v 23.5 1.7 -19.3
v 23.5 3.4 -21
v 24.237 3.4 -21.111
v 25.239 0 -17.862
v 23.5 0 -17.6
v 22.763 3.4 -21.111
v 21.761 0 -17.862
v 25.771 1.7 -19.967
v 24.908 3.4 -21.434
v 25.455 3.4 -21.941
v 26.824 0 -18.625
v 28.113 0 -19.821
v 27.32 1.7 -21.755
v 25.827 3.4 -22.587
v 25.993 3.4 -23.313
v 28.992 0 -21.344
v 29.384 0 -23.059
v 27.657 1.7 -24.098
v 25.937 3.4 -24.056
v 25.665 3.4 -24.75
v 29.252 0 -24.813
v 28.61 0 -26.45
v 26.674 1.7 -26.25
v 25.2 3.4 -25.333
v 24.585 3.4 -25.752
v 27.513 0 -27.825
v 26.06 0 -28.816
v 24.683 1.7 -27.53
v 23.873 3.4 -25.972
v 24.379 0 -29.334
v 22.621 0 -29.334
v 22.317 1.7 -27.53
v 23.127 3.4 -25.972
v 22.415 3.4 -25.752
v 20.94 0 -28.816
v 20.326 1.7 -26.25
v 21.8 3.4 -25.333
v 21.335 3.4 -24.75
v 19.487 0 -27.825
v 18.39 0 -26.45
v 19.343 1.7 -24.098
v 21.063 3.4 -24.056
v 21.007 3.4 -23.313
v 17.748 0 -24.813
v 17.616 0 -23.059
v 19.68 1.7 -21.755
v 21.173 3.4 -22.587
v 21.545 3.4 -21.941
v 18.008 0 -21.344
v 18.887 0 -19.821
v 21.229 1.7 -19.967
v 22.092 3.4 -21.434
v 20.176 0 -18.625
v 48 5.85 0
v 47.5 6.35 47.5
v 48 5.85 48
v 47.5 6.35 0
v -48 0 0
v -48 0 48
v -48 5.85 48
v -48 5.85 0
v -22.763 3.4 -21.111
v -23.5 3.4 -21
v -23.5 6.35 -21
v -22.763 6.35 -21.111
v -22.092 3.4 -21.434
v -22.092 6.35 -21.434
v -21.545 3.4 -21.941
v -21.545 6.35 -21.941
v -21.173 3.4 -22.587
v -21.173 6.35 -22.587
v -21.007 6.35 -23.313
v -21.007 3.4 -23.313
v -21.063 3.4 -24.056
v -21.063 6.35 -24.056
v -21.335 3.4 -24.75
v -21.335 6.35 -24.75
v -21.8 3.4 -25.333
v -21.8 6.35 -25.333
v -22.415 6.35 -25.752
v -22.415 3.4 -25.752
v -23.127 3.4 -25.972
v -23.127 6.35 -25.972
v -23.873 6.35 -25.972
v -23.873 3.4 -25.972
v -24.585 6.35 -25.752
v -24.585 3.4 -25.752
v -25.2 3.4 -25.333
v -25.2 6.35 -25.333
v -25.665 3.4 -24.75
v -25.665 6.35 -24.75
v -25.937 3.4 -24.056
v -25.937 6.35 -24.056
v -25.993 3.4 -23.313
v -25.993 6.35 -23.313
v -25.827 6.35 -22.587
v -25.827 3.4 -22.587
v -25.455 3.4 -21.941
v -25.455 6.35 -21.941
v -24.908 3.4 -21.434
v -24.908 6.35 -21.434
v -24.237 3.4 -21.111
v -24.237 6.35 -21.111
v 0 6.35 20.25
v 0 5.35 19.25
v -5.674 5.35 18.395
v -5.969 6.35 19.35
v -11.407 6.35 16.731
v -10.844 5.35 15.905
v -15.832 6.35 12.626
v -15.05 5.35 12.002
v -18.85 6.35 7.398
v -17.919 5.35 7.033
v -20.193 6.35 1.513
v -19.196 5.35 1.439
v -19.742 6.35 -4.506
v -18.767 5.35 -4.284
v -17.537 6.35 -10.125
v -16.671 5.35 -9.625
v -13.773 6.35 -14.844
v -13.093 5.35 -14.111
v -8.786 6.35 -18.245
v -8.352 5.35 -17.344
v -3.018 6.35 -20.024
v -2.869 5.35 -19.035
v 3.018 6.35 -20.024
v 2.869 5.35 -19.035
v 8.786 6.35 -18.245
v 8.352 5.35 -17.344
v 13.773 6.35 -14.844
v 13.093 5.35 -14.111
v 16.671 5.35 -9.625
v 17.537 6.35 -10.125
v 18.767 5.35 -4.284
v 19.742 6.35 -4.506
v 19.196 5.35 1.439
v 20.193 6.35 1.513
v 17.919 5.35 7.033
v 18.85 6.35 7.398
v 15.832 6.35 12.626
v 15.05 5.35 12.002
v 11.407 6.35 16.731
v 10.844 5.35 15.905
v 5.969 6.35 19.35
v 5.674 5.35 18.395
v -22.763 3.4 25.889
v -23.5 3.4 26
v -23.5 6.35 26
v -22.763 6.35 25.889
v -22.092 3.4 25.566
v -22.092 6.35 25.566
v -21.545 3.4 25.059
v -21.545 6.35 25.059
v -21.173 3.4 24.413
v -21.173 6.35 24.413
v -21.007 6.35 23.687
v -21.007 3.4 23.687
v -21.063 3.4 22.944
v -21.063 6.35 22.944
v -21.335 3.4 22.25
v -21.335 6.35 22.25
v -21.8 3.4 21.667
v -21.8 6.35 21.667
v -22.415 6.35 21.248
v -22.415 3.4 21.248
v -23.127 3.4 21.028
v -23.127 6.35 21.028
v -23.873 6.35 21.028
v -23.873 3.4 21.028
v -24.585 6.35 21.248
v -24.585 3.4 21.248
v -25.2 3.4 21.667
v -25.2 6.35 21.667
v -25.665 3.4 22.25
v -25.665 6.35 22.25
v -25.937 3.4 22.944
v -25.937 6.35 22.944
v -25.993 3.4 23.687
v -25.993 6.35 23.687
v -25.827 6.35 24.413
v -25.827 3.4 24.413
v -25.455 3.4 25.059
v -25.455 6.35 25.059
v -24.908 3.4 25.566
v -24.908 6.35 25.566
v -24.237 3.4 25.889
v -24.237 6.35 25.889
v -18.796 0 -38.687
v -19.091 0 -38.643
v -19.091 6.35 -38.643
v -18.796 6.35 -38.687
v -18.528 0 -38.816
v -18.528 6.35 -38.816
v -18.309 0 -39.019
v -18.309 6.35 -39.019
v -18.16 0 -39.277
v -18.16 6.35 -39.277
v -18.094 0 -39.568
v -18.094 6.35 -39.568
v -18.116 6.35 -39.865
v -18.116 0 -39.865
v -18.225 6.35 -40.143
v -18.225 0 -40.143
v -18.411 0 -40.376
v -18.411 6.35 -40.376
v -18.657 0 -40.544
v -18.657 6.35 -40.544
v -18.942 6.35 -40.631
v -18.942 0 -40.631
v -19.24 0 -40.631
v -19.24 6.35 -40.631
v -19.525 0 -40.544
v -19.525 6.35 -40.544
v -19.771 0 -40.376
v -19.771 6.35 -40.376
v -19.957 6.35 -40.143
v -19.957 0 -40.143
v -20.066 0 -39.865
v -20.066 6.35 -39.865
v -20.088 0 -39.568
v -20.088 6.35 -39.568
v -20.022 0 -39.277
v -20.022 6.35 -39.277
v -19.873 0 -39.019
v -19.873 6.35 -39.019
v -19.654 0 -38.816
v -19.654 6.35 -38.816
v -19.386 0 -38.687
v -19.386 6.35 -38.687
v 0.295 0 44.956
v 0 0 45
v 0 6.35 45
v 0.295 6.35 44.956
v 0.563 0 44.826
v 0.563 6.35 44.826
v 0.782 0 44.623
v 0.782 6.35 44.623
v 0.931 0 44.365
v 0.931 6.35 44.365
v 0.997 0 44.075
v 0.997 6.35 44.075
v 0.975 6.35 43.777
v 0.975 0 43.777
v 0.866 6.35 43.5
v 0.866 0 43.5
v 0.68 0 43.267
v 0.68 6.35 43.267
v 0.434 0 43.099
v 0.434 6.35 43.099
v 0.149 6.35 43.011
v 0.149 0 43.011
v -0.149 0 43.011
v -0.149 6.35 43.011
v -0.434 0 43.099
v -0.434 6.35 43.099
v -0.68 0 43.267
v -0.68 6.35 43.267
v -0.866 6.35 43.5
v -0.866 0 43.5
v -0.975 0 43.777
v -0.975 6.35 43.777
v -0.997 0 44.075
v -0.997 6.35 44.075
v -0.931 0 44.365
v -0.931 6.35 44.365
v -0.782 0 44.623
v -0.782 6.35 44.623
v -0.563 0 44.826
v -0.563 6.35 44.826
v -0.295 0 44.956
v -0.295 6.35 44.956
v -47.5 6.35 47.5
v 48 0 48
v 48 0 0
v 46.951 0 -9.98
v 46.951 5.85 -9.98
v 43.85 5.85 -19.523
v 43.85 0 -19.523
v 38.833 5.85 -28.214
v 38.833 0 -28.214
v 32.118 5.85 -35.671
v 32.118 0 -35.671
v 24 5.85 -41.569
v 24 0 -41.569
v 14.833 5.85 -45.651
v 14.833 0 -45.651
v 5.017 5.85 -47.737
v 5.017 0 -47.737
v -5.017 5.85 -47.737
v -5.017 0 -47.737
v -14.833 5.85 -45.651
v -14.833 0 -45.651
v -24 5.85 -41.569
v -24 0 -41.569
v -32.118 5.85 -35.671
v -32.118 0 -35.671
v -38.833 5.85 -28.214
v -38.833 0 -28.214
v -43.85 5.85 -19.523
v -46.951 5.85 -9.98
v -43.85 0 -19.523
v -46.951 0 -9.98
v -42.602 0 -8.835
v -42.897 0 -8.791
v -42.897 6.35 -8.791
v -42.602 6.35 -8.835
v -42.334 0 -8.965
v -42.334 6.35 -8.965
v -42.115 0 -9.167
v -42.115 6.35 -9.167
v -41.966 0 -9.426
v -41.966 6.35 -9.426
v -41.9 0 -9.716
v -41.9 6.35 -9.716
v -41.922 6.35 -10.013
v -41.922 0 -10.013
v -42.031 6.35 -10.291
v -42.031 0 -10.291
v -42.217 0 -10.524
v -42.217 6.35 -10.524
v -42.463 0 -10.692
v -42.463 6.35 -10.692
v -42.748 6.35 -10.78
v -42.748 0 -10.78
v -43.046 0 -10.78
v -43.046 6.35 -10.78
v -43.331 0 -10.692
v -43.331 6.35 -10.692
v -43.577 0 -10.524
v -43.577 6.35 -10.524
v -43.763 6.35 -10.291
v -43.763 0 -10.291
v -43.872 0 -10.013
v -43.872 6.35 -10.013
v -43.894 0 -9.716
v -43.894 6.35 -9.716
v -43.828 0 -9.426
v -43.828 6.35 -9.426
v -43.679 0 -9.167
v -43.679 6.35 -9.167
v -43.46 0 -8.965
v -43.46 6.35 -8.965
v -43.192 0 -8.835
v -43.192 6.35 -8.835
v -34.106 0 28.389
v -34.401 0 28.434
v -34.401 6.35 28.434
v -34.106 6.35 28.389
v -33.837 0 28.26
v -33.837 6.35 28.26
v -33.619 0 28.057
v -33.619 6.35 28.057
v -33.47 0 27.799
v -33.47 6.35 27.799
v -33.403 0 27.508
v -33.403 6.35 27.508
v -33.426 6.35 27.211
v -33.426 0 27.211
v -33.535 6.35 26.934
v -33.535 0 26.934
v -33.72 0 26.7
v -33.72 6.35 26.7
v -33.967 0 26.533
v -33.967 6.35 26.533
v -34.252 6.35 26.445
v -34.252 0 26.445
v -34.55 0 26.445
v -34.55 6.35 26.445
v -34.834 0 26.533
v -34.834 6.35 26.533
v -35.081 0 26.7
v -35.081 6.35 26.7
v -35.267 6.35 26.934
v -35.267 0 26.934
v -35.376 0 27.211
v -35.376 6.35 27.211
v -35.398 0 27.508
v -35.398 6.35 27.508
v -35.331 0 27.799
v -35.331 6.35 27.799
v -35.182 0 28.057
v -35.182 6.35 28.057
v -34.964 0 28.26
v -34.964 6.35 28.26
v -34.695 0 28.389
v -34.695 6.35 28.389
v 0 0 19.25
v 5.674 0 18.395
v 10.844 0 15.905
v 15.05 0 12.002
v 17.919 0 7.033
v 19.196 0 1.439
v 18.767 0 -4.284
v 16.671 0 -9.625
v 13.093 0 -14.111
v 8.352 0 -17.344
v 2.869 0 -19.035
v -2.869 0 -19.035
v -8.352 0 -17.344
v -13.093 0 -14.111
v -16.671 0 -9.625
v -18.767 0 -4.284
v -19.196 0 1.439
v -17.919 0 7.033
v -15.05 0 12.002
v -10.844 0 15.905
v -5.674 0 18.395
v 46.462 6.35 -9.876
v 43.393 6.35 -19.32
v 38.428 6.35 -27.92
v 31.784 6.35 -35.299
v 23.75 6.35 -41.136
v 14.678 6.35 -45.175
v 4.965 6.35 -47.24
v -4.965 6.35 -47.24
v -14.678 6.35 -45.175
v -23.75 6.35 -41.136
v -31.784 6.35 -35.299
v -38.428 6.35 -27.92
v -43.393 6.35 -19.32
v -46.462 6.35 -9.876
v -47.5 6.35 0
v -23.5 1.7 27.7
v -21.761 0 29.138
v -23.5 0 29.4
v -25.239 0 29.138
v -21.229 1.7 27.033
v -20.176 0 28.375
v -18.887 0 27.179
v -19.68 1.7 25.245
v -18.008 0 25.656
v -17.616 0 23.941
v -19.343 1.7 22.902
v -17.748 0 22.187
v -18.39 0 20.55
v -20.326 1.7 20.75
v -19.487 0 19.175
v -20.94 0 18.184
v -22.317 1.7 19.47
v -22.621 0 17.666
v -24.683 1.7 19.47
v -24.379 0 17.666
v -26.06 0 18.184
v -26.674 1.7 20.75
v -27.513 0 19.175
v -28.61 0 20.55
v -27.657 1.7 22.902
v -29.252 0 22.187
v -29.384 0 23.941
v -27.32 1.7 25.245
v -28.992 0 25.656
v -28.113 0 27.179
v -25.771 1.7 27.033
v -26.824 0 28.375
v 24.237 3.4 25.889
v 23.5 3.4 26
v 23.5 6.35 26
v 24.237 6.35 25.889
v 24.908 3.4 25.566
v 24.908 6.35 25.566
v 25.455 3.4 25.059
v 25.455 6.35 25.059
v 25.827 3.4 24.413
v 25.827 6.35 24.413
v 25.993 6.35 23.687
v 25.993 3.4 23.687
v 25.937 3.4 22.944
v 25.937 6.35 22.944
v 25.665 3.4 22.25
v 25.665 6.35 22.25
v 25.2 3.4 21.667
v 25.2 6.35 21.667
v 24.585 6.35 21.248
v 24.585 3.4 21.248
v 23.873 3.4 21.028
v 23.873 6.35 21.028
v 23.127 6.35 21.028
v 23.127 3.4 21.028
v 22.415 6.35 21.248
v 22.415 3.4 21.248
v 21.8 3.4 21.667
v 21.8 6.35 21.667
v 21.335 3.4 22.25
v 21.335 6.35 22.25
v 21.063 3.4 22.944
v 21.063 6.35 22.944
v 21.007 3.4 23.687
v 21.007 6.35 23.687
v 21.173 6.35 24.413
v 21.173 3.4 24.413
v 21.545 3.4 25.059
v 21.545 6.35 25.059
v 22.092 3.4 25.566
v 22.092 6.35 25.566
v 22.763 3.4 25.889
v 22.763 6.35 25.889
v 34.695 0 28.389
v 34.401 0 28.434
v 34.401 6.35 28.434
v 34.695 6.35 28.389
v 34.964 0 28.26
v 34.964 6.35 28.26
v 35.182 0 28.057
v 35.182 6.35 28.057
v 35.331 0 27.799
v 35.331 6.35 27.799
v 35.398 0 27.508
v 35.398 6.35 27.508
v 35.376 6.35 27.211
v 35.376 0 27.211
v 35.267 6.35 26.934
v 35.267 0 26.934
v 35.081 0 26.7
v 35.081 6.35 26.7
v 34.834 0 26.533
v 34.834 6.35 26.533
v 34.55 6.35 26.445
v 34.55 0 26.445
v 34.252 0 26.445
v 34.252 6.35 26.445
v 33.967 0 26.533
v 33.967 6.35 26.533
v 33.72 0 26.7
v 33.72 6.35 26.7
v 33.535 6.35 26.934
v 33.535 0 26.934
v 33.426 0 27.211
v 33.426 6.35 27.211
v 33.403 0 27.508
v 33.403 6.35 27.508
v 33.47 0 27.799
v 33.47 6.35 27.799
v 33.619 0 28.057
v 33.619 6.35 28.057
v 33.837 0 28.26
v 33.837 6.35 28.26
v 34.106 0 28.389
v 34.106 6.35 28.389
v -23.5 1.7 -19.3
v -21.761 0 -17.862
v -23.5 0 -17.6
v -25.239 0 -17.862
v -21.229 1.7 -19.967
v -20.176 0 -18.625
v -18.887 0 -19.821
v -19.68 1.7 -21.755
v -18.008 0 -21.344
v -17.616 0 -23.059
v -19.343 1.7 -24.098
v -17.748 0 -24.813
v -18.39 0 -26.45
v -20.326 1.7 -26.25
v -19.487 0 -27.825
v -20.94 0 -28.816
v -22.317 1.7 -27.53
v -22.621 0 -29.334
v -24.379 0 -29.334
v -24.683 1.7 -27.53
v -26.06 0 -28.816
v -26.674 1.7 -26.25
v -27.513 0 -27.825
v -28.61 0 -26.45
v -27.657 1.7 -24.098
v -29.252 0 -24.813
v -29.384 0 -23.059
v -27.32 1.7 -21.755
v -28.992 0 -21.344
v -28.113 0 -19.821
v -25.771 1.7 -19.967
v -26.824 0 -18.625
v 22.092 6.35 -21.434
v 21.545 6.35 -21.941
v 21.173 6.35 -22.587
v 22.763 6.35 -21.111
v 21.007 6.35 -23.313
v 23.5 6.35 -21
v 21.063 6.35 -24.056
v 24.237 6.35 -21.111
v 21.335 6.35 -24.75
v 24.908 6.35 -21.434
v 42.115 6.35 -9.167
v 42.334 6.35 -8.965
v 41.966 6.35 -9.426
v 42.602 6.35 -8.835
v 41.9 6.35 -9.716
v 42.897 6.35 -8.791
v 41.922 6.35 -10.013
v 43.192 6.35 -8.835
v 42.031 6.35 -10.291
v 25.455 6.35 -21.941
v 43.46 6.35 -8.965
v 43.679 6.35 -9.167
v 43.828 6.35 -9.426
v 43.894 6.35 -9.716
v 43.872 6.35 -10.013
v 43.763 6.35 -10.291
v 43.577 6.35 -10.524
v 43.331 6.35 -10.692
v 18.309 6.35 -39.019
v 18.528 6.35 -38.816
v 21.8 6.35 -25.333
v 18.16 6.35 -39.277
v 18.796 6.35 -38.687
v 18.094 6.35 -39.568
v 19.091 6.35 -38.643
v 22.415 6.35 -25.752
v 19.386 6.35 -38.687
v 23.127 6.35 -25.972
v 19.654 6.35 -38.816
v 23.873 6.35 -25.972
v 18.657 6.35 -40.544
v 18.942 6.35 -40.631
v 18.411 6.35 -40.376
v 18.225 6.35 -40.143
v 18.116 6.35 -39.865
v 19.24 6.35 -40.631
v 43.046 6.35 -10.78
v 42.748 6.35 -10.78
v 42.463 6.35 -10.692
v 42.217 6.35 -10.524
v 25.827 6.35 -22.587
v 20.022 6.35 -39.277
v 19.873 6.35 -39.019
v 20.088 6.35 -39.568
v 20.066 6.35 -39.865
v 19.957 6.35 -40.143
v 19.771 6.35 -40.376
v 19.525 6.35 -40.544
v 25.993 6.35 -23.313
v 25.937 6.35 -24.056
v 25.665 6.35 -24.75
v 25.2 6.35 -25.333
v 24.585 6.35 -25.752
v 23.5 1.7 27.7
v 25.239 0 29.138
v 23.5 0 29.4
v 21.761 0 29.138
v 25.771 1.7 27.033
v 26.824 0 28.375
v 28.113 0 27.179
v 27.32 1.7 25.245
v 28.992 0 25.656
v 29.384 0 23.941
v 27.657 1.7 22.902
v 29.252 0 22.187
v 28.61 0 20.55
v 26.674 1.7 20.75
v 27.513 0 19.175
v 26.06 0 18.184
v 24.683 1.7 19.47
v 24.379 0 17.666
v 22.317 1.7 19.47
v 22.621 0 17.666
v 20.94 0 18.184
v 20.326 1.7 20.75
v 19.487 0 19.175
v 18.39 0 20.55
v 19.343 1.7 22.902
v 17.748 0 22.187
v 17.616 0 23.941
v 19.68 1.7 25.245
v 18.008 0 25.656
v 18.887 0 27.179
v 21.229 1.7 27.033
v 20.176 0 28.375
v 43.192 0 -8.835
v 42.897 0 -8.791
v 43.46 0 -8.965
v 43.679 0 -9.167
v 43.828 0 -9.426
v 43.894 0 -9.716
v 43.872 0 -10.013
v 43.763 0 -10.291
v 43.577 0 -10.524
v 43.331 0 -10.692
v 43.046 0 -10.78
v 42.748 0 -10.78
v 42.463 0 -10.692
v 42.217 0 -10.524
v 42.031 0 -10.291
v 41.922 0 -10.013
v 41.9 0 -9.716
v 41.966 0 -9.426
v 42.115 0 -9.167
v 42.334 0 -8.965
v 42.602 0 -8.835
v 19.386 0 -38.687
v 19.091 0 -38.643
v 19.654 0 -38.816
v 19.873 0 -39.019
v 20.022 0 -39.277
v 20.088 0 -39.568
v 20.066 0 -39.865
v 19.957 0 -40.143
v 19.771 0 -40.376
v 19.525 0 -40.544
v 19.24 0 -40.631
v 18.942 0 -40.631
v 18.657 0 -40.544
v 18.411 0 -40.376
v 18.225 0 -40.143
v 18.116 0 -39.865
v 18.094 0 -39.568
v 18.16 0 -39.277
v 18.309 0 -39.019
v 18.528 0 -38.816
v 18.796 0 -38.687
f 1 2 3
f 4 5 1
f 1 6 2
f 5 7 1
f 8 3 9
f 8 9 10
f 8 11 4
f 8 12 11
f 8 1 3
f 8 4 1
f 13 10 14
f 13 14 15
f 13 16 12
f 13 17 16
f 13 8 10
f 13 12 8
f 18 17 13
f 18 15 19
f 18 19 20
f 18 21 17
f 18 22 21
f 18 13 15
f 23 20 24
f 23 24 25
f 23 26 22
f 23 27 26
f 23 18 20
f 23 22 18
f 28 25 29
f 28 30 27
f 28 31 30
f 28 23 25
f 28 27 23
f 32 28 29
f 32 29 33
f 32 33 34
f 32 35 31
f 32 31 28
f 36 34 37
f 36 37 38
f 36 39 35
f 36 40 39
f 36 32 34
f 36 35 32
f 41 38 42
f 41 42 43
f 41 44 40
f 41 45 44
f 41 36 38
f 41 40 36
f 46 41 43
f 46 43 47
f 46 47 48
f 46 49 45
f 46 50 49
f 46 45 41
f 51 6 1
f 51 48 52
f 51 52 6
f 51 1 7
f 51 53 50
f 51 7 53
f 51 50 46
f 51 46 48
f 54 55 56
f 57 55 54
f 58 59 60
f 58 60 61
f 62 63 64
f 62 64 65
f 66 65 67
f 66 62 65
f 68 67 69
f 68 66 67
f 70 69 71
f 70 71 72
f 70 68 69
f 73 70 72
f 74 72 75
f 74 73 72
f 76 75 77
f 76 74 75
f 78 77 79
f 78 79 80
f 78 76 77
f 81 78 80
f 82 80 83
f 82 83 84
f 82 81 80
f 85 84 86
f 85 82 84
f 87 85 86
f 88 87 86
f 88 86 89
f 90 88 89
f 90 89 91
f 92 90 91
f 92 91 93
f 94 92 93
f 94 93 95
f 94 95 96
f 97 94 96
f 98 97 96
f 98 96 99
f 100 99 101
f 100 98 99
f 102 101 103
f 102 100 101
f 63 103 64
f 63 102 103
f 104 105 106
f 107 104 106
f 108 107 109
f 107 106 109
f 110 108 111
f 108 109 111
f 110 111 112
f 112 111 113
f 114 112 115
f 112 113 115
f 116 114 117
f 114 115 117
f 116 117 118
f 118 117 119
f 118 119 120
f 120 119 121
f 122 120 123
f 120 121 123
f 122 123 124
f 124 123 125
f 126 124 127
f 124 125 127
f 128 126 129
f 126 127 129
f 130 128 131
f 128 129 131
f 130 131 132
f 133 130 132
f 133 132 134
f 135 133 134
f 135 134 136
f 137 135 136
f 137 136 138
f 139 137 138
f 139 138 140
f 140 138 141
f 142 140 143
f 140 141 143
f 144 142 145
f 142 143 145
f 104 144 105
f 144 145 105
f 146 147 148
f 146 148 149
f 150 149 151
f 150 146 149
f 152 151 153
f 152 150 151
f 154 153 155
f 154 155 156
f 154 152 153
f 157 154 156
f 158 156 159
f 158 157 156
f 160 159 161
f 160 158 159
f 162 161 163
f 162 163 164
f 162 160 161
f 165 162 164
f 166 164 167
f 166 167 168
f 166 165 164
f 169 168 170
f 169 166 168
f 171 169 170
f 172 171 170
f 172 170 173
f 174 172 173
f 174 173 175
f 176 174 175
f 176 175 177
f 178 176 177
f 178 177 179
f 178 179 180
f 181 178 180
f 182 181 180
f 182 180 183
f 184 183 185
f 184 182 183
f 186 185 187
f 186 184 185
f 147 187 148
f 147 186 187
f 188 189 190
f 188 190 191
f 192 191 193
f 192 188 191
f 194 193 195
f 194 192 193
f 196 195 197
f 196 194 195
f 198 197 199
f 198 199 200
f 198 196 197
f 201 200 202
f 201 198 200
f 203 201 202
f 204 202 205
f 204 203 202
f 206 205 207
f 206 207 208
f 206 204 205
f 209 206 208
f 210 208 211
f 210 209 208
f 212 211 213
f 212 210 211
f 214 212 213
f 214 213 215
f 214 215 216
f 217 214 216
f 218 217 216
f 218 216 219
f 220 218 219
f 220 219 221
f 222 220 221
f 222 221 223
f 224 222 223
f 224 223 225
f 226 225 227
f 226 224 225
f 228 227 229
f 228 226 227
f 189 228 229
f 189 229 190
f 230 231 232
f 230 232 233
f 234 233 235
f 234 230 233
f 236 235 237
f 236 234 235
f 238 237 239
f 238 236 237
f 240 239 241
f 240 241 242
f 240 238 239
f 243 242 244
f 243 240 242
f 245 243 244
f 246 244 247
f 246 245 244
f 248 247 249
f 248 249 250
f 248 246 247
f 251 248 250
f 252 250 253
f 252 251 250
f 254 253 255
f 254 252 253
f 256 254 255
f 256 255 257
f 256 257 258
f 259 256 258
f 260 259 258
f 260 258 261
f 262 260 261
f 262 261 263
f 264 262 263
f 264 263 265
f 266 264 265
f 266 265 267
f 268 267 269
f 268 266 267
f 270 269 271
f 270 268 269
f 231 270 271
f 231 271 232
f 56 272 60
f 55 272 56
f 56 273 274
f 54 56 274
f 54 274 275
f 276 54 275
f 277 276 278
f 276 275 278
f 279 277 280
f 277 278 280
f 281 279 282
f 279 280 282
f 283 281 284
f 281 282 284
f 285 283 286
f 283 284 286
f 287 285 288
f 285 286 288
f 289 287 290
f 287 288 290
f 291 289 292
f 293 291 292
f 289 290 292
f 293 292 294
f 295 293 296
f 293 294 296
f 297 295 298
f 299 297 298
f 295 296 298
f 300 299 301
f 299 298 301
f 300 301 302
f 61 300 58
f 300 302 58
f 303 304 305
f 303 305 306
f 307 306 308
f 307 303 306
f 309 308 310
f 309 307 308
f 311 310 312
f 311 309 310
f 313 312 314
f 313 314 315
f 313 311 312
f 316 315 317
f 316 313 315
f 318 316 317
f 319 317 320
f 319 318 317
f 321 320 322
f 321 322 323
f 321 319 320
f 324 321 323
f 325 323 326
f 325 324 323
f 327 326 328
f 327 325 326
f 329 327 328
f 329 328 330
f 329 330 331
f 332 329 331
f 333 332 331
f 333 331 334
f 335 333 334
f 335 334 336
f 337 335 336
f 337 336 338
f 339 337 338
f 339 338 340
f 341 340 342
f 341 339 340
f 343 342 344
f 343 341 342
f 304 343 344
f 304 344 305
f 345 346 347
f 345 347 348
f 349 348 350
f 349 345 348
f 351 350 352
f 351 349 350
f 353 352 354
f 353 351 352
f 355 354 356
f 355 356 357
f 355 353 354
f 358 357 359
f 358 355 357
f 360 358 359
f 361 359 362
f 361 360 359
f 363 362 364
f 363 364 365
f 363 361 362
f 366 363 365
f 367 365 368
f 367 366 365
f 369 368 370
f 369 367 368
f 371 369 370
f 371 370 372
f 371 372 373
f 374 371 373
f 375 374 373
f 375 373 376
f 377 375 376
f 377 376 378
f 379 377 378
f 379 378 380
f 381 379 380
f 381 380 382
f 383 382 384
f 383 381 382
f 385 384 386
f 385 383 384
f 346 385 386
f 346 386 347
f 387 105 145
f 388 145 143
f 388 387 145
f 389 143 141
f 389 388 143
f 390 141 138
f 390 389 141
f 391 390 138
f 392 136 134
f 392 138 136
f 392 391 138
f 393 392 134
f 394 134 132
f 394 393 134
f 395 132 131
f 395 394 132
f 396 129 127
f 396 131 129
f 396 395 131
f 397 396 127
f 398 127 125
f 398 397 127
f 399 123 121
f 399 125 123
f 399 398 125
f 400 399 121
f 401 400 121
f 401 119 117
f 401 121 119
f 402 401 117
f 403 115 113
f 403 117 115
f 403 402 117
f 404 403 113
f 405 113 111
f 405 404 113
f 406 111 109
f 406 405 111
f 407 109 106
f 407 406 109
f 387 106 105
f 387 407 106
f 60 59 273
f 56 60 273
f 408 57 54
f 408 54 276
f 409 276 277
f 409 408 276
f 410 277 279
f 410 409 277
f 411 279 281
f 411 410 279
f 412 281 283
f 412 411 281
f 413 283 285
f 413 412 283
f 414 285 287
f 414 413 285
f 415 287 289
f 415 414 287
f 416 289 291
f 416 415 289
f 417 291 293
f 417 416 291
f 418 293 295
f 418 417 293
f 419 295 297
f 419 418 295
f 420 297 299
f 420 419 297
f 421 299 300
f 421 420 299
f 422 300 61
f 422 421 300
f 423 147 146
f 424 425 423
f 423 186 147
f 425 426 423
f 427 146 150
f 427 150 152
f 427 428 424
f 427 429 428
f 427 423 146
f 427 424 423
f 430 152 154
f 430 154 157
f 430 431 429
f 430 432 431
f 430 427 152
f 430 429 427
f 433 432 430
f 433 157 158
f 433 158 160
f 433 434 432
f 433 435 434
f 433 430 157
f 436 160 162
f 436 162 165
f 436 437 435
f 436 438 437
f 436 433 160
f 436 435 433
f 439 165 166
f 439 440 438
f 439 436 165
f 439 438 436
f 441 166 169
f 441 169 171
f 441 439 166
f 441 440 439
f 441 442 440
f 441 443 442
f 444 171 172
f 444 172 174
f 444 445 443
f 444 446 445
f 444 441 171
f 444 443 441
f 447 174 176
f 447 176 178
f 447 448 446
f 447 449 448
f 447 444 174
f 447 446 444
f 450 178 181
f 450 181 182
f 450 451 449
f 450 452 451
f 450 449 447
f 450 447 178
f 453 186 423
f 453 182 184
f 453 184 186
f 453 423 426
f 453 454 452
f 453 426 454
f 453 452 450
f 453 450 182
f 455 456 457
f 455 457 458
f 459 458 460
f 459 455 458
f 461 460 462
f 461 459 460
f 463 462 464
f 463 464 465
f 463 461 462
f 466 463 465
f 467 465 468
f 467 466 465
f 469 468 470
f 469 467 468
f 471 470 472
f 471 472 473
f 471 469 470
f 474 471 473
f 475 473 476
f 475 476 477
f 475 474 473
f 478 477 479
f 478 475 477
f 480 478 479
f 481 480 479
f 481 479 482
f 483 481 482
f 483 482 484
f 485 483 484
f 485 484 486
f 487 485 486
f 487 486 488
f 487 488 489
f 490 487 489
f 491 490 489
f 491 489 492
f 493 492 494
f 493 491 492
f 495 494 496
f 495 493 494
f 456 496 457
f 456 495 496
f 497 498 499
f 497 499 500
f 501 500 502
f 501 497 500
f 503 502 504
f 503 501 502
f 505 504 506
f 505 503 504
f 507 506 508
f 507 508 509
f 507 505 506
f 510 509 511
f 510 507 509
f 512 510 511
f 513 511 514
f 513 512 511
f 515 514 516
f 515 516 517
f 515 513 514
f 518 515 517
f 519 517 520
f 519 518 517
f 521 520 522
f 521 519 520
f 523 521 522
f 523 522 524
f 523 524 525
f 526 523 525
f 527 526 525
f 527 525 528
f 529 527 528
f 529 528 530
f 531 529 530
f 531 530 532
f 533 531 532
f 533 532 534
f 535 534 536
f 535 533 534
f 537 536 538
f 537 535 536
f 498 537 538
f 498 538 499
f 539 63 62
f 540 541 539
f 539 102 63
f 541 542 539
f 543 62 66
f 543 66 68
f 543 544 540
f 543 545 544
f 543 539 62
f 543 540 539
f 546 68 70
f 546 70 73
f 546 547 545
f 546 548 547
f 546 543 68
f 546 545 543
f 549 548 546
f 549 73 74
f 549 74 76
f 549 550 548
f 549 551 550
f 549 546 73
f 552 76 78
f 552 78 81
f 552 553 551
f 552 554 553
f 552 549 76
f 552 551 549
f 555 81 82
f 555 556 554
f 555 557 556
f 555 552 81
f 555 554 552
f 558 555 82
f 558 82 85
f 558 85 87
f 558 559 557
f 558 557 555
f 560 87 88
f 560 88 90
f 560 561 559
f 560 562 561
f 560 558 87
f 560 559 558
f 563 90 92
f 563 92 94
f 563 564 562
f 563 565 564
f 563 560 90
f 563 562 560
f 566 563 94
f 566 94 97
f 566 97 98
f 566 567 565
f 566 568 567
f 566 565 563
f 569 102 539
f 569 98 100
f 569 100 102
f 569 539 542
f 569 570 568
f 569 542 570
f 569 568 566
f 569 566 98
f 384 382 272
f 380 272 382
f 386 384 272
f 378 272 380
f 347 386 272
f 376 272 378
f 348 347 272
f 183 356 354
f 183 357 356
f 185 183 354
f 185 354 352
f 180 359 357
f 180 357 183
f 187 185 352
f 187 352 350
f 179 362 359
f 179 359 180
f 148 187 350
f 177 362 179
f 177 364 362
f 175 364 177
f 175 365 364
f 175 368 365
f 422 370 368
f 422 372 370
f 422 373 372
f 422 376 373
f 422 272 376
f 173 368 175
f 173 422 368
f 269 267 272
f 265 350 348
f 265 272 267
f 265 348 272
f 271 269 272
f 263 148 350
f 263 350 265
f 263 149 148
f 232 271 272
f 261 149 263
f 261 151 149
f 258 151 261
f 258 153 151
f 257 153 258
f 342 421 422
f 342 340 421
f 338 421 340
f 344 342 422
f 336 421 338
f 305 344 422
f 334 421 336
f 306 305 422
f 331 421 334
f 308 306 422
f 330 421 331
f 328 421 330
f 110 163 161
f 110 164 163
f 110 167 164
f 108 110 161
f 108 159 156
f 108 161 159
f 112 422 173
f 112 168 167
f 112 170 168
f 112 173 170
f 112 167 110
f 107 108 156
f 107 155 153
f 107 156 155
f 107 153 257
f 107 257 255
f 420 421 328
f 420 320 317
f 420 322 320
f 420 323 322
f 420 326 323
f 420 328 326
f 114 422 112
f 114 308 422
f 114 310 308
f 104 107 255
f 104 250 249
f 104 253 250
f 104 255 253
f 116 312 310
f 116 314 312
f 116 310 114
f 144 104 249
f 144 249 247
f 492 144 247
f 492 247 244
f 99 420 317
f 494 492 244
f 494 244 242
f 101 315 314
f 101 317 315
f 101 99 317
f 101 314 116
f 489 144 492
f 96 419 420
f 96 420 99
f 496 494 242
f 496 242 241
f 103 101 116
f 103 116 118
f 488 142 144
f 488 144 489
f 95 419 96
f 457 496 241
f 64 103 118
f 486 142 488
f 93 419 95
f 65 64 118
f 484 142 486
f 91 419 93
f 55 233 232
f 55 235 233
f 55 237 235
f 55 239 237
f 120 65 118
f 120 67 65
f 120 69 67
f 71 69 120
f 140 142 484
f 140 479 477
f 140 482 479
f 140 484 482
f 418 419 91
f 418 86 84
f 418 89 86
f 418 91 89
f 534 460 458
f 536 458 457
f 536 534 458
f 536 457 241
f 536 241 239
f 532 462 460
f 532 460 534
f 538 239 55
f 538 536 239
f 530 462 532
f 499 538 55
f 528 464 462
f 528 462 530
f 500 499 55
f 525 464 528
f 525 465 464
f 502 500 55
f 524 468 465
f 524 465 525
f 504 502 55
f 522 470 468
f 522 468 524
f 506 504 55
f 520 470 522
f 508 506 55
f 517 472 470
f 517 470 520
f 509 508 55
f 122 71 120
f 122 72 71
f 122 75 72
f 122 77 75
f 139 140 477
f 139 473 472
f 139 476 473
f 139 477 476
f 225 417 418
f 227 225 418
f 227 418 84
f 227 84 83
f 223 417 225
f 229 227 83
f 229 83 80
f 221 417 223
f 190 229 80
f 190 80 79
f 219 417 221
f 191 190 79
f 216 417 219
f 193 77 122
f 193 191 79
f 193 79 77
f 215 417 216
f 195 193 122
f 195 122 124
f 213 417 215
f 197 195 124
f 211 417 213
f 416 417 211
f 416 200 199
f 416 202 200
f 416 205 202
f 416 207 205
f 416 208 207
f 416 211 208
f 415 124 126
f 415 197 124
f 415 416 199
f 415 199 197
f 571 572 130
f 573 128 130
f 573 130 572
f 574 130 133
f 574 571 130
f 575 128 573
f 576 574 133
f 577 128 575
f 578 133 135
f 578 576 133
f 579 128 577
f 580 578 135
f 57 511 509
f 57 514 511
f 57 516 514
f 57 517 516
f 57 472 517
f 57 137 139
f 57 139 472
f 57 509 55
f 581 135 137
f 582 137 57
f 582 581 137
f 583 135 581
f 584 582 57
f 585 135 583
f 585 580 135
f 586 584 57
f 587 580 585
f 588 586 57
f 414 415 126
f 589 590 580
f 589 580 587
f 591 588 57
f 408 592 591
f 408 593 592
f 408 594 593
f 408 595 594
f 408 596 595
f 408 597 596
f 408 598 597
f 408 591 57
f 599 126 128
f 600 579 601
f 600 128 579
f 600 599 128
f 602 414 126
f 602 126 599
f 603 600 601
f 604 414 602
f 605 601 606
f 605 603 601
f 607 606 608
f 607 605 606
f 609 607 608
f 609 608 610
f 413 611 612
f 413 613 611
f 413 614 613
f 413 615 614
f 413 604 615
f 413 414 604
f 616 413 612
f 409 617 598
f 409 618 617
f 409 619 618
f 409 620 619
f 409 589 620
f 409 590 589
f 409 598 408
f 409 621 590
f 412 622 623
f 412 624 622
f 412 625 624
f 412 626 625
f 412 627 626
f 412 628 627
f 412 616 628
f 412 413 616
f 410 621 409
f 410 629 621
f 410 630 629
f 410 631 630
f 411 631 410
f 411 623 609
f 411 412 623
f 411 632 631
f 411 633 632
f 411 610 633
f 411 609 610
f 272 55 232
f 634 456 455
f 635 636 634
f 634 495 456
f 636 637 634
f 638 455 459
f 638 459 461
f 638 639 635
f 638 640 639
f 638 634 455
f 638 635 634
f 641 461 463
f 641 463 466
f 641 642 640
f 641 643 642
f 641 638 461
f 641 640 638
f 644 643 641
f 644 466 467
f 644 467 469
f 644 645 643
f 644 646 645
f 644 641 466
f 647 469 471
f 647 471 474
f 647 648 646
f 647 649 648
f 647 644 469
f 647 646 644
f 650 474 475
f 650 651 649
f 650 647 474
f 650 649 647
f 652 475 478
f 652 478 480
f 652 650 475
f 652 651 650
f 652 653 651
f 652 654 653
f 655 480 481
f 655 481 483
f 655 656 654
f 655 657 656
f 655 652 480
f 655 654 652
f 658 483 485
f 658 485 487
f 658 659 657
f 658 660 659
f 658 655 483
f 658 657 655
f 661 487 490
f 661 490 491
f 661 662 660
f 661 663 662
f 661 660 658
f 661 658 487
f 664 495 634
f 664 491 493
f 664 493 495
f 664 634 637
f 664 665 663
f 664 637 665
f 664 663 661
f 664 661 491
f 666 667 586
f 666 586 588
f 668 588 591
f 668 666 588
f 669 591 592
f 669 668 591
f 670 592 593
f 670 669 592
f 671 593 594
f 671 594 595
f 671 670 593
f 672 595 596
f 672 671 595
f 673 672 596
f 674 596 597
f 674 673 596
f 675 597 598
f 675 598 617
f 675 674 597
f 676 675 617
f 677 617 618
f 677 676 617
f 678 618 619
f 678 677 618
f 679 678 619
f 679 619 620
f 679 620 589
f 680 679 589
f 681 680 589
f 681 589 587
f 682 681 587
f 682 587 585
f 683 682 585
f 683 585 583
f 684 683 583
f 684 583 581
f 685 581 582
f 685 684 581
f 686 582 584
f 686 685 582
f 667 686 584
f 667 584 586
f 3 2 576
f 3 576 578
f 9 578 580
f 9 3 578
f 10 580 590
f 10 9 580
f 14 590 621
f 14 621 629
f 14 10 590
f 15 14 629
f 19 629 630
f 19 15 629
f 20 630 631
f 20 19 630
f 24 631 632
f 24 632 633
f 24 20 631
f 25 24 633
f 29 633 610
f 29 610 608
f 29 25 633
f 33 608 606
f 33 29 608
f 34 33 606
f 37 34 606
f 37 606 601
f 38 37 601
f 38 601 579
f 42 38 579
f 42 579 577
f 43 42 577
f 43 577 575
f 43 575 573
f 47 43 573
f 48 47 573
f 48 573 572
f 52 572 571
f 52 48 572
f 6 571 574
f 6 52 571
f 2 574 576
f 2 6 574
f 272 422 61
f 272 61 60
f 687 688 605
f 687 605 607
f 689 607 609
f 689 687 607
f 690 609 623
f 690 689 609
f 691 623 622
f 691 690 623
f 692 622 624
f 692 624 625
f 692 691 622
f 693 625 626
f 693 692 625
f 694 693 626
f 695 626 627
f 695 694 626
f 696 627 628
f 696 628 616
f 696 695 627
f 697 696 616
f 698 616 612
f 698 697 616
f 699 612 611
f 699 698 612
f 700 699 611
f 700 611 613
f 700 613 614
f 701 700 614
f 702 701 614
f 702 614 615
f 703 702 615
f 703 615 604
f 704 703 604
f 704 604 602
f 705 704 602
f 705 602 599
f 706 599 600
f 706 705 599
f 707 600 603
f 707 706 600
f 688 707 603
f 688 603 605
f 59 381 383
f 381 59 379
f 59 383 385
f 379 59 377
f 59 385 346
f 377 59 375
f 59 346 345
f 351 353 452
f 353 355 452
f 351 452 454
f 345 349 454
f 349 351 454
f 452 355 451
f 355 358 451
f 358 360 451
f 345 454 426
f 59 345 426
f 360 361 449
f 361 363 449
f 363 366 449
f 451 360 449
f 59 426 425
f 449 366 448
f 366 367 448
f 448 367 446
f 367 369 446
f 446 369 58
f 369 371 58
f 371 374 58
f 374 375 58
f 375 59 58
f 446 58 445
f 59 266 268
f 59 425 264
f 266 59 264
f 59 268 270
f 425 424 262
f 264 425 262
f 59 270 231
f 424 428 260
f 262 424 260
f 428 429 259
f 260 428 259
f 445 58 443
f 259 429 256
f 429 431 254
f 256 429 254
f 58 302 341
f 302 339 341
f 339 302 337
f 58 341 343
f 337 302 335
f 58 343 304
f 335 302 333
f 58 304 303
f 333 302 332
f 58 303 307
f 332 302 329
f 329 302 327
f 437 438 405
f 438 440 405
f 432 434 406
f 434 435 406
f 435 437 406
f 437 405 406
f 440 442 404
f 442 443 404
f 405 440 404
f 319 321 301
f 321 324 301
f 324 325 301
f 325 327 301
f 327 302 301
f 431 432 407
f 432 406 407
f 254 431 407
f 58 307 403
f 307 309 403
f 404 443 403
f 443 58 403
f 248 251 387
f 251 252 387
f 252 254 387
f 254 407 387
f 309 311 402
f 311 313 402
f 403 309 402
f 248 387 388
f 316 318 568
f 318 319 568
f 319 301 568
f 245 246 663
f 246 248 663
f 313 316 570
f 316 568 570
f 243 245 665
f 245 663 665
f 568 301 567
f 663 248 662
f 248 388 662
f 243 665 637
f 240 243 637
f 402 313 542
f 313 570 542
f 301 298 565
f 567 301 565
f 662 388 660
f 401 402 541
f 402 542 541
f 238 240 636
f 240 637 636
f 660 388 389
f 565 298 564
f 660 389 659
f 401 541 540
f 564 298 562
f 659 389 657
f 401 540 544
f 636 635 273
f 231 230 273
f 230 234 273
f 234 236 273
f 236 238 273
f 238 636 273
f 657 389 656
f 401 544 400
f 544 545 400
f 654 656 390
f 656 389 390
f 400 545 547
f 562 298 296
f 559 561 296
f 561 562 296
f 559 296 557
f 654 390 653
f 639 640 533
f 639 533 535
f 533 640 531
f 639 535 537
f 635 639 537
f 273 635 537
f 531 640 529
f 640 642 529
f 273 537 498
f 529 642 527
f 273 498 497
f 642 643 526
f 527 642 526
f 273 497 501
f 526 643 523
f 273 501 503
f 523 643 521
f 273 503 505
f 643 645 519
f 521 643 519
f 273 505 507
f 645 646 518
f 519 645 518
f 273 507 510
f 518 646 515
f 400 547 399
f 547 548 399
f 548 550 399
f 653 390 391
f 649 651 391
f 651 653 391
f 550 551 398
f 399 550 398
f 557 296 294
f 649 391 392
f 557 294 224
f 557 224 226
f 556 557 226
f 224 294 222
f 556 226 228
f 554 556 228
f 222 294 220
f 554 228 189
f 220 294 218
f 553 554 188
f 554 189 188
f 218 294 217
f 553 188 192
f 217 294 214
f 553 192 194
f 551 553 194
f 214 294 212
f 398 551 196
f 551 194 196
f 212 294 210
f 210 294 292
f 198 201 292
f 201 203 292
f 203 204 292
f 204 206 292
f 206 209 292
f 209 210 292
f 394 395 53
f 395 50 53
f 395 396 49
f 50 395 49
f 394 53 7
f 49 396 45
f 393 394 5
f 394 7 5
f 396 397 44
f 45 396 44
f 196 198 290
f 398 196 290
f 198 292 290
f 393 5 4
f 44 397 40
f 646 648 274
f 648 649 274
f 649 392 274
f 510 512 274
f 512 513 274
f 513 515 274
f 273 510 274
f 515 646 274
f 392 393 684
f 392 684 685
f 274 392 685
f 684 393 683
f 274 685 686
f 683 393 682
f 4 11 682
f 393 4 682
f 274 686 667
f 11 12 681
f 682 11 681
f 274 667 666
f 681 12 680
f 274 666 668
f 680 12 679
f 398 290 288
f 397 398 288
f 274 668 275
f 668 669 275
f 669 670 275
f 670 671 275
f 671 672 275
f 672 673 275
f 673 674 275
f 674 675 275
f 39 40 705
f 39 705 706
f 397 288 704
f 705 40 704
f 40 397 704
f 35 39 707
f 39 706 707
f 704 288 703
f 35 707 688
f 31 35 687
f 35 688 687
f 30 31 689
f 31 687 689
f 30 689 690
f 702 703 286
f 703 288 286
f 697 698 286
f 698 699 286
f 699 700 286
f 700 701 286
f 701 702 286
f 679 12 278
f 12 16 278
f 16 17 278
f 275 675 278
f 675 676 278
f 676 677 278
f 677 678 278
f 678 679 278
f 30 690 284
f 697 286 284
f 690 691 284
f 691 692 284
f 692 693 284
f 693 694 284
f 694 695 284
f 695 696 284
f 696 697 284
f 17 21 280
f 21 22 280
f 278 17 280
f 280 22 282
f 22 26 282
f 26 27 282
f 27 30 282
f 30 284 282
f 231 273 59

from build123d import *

# Parameters (mm, degrees)
SKETCH6_W           = 96
SKETCH6_H           = 48
BOSS_EXTRUDE1_DEPTH = 6.35
SKETCH2_R           = 48
SKETCH2_R_2         = 1
SKETCH2_R_3         = 19.25
SKETCH2_R_4         = 2.5
BOSS_EXTRUDE2_DEPTH = 6.35
SKETCH2_4_R         = 1
SKETCH2_4_R_2       = 19.25
SKETCH2_4_R_3       = 2.5
CUT_EXTRUDE1_DEPTH  = 6.35
CHAMFER1_SIZE       = 0.5
CHAMFER3_SIZE       = 1
CHAMFER5_SIZE       = 3.4


with BuildPart() as part:
    # Sketch6 → Boss-Extrude1 (new body)
    with BuildSketch(Plane(origin=(0, 0, 0), x_dir=(1, 0, 0), z_dir=(0, 1, 0))):
        with Locations((0, -24)):
            Rectangle(SKETCH6_W, SKETCH6_H)
    extrude(amount=BOSS_EXTRUDE1_DEPTH)

    # Sketch2 → Boss-Extrude2 (add)
    with BuildSketch(Plane(origin=(0, 0, 0), x_dir=(1, 0, 0), z_dir=(0, 1, 0))):
        Circle(SKETCH2_R)
        with Locations((0, -44)):
            Circle(SKETCH2_R_2, mode=Mode.SUBTRACT)
        with Locations((-34.400585229, -27.433551282)):
            Circle(SKETCH2_R_2, mode=Mode.SUBTRACT)
        with Locations((-42.896828136, 9.790921094)):
            Circle(SKETCH2_R_2, mode=Mode.SUBTRACT)
        with Locations((-19.090884521, 39.642630188)):
            Circle(SKETCH2_R_2, mode=Mode.SUBTRACT)
        with Locations((19.090884521, 39.642630188)):
            Circle(SKETCH2_R_2, mode=Mode.SUBTRACT)
        with Locations((42.896828136, 9.790921094)):
            Circle(SKETCH2_R_2, mode=Mode.SUBTRACT)
        with Locations((34.400585229, -27.433551282)):
            Circle(SKETCH2_R_2, mode=Mode.SUBTRACT)
        Circle(SKETCH2_R_3, mode=Mode.SUBTRACT)
        with Locations((23.5, 23.5)):
            Circle(SKETCH2_R_4, mode=Mode.SUBTRACT)
        with Locations((23.5, -23.5)):
            Circle(SKETCH2_R_4, mode=Mode.SUBTRACT)
        with Locations((-23.5, -23.5)):
            Circle(SKETCH2_R_4, mode=Mode.SUBTRACT)
        with Locations((-23.5, 23.5)):
            Circle(SKETCH2_R_4, mode=Mode.SUBTRACT)
    extrude(amount=BOSS_EXTRUDE2_DEPTH)

    # Sketch2<4> → Cut-Extrude1 (cut)
    with BuildSketch(Plane(origin=(0, 0, 0), x_dir=(1, 0, 0), z_dir=(0, 1, 0))):
        with Locations((0, -44)):
            Circle(SKETCH2_4_R)
        with Locations((-34.400585229, -27.433551282)):
            Circle(SKETCH2_4_R)
        with Locations((34.400585229, -27.433551282)):
            Circle(SKETCH2_4_R)
        Circle(SKETCH2_4_R_2)
        with Locations((23.5, -23.5)):
            Circle(SKETCH2_4_R_3)
        with Locations((-23.5, -23.5)):
            Circle(SKETCH2_4_R_3)
    extrude(amount=CUT_EXTRUDE1_DEPTH, mode=Mode.SUBTRACT)

    # Chamfer1
    chamfer1_edges = [part.edges().sort_by_distance(p)[0] for p in [
        (-48, 6.35, 24),
        (0, 6.35, -48),
        (48, 6.35, 24),
        (0, 6.35, 48),
    ]]
    chamfer(chamfer1_edges, length=CHAMFER1_SIZE)

    # Chamfer3
    chamfer3_edges = [part.edges().sort_by_distance(p)[0] for p in [
        (-19.25, 6.35, 0),
    ]]
    chamfer(chamfer3_edges, length=CHAMFER3_SIZE)

    # Chamfer5
    chamfer5_edges = [part.edges().sort_by_distance(p)[0] for p in [
        (21, 0, 23.5),
        (21, 0, -23.5),
        (-26, 0, -23.5),
        (-26, 0, 23.5),
    ]]
    chamfer(chamfer5_edges, length=CHAMFER5_SIZE)


solid = part.part
